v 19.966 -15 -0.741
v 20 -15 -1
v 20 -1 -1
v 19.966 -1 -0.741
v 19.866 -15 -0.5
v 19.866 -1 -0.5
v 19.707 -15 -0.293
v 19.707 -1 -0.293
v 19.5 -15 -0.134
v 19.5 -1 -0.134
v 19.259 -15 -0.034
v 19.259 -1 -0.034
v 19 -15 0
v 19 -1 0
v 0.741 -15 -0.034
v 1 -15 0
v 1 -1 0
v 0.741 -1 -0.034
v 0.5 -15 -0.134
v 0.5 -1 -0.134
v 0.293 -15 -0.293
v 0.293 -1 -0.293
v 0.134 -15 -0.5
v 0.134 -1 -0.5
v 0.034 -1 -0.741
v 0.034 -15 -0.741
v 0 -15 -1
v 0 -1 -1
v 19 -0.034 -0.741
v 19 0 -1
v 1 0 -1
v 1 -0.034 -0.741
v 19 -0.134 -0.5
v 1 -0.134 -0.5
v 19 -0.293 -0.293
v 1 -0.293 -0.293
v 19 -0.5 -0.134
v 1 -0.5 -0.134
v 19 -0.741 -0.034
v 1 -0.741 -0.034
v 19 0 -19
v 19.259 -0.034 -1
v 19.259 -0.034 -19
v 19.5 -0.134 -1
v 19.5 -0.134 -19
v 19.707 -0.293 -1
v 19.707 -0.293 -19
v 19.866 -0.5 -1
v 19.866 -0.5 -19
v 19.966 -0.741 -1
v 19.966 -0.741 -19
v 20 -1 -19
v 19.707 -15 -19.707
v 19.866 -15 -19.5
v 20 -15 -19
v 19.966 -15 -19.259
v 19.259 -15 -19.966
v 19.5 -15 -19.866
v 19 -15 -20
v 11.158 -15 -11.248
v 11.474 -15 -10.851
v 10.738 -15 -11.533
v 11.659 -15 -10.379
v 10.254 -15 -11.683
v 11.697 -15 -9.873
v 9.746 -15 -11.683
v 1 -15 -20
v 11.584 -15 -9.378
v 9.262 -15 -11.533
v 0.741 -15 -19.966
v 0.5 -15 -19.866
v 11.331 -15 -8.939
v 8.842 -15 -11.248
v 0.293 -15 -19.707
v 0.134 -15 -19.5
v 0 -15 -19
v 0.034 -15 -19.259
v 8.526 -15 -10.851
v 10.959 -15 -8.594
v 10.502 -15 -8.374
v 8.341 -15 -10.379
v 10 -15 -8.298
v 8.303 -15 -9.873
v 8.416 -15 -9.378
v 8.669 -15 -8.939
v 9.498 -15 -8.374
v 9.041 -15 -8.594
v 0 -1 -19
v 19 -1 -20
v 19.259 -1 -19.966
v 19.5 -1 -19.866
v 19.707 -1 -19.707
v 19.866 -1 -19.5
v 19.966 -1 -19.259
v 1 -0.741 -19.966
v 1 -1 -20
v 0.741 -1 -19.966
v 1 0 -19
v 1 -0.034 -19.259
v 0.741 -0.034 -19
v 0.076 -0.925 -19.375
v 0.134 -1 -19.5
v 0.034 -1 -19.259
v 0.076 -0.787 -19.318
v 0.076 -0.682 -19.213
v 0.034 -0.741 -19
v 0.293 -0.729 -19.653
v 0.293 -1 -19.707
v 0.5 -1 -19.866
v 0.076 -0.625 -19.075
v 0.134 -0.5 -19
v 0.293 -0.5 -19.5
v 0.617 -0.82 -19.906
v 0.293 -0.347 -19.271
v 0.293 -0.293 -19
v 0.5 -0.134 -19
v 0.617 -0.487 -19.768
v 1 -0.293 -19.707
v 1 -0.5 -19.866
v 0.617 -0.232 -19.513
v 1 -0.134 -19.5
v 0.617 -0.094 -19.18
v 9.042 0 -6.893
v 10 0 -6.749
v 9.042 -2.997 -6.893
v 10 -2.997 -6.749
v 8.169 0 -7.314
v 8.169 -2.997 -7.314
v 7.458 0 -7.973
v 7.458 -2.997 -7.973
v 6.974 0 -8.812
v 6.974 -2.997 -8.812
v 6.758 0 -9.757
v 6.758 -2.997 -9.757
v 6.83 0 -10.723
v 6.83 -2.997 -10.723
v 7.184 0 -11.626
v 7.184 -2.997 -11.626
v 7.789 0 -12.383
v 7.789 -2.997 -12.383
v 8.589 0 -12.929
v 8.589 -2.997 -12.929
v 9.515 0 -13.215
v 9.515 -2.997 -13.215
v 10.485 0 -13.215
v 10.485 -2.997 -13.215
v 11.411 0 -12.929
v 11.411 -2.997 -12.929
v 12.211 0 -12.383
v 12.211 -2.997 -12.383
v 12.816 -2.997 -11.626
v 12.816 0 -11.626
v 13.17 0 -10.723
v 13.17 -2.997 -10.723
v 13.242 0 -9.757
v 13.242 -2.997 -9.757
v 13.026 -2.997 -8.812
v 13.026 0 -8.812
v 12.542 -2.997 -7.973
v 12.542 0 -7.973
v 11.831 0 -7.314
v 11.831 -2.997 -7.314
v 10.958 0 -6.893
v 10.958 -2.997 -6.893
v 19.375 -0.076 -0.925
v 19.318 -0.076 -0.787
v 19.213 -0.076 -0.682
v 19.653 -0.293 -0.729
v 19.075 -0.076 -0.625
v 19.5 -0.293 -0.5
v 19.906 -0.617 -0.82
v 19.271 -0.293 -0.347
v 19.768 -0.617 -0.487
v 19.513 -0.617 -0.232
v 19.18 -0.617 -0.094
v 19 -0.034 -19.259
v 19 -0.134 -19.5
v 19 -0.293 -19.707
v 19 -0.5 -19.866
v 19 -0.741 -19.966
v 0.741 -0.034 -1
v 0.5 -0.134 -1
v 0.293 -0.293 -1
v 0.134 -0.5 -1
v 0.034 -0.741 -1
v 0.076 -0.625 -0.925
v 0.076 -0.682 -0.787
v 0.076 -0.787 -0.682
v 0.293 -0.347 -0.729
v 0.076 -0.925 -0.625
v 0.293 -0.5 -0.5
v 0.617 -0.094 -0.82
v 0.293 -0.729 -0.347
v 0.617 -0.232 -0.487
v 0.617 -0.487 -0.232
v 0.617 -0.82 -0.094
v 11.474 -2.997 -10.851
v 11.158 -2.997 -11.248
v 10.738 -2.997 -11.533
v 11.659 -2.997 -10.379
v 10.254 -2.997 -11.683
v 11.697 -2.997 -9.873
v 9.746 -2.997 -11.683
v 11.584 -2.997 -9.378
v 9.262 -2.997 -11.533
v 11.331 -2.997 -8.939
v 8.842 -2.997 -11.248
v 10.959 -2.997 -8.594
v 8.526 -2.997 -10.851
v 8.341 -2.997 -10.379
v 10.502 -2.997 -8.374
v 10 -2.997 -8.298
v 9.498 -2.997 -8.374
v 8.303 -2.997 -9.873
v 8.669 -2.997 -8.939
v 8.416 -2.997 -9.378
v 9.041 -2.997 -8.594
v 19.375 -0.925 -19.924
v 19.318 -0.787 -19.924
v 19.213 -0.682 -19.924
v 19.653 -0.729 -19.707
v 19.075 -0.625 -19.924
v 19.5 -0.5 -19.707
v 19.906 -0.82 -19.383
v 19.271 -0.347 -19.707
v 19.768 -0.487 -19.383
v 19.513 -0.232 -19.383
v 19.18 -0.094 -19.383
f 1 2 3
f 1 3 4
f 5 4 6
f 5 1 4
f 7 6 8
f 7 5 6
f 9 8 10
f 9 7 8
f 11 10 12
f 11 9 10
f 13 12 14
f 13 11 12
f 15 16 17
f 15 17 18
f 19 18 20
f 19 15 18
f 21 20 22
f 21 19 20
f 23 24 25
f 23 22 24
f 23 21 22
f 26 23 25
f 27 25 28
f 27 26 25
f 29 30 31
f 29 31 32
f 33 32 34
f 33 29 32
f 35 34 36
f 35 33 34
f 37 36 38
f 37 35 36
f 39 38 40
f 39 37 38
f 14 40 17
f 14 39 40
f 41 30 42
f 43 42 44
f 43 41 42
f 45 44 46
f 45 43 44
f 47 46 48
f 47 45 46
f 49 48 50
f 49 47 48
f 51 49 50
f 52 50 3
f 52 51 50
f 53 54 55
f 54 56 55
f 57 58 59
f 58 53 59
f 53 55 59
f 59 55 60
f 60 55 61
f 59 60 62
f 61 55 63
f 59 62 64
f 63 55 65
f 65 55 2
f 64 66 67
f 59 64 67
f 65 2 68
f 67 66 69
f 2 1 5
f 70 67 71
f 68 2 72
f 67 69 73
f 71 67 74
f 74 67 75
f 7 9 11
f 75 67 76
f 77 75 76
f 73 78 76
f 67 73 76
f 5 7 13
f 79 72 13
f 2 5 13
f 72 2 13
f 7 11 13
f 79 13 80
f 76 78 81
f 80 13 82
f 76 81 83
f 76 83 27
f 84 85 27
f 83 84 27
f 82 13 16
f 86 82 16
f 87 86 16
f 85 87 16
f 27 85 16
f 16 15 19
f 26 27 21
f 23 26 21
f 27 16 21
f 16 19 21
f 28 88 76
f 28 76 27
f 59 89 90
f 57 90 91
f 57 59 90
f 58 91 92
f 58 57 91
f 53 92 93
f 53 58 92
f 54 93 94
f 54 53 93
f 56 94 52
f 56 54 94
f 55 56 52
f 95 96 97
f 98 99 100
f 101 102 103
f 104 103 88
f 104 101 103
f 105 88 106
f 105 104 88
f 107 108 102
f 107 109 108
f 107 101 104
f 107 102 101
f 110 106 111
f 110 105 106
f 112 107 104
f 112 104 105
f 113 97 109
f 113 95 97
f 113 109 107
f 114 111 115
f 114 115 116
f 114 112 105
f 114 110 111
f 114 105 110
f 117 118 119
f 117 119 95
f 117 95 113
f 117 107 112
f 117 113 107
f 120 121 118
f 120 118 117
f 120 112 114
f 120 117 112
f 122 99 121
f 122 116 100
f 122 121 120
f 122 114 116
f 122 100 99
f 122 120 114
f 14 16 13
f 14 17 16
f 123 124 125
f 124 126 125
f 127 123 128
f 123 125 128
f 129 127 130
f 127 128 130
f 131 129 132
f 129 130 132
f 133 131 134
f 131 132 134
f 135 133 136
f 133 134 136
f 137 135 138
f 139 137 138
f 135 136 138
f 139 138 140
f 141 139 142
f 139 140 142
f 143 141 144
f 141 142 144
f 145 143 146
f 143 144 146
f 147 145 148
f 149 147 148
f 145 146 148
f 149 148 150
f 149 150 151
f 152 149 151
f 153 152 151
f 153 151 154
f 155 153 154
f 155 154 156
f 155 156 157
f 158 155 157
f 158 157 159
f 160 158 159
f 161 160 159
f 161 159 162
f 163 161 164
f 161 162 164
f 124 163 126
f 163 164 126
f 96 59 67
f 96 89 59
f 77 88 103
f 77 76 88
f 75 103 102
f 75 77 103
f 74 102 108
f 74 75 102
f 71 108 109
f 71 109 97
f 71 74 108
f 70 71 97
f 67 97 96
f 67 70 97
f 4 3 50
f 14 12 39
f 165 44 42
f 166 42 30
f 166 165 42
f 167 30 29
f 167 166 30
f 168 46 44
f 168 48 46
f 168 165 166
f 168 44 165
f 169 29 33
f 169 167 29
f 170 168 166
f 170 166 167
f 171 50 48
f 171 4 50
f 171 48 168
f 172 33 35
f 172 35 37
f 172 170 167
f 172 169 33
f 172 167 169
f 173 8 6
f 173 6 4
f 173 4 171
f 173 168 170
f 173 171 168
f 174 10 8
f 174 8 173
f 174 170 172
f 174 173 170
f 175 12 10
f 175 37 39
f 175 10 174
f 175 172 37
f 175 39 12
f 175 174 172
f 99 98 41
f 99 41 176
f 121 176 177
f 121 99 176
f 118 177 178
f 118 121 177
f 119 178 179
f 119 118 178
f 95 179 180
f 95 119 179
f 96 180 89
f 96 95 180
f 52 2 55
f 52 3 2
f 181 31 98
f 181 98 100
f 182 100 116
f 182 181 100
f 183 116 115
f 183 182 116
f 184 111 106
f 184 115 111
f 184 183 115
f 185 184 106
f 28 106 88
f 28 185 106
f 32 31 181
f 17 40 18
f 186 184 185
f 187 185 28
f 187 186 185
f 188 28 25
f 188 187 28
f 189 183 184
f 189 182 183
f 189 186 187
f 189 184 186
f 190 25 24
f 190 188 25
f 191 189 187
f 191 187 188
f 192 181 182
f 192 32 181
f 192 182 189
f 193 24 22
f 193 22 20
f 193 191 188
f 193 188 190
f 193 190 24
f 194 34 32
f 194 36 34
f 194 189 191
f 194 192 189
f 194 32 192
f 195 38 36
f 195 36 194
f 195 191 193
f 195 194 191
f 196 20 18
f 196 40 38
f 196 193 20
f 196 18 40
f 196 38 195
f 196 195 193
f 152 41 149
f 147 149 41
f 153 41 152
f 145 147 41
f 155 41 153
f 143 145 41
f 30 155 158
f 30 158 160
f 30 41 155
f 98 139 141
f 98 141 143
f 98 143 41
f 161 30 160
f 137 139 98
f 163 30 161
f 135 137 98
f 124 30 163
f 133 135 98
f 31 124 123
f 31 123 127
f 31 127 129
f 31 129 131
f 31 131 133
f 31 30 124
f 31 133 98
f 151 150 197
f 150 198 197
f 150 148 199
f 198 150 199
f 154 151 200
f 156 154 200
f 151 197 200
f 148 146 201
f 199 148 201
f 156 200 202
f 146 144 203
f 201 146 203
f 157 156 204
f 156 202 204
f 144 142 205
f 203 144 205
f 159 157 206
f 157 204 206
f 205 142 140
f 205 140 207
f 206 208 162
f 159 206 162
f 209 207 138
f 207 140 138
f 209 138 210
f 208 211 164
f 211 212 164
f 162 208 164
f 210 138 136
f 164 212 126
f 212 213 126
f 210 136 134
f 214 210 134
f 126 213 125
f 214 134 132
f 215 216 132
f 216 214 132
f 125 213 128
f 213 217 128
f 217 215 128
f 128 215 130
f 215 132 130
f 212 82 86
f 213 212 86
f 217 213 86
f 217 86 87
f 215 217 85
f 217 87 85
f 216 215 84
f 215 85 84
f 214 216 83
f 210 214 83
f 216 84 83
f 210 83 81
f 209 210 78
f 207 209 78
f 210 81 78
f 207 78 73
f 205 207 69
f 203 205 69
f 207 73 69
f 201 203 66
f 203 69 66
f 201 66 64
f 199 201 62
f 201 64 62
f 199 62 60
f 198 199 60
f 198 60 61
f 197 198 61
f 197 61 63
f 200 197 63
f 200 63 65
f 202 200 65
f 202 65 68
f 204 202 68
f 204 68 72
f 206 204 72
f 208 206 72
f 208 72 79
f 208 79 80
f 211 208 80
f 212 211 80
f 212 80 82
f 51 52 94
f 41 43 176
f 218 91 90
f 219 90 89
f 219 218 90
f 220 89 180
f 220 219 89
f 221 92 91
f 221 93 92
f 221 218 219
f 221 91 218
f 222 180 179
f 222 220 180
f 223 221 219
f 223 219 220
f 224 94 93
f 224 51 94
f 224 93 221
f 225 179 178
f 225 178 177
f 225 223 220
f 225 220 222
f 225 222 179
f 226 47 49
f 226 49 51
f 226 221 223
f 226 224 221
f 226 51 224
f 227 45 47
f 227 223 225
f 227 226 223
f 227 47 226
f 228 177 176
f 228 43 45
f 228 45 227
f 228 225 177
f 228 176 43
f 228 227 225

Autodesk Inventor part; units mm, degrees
ref_plane "YZ Plane" through (0, 0, 0) normal (1, 0, 0) x (0, 1, 0)
ref_plane "XZ Plane" through (0, 0, 0) normal (0, 1, 0) x (-1, 0, 0)
ref_plane "XY Plane" through (0, 0, 0) normal (0, 0, 1) x (1, 0, 0)
sketch "Sketch1" plane through (0, 0, 0) normal (0, 1, 0) x (-1, 0, 0)
  line L0 (0, 0) -> (-20, 0)
  line L1 (-20, 0) -> (-20, -20)
  line L2 (-20, -20) -> (0, -20)
  line L3 (0, -20) -> (0, 0)
  point P0 (-10, -10)
  point P1 (-20, -10)
  point P2 (-10, -20)
  dimension "d0" = 20
  dimension "d1" = 20
extrude "Extrusion1" add sketch "Sketch1" against normal blind 15
hole "Hole1" at (10, 0, -10) direction (0, -1, 0) diameter 3.4036 end through all counterbore diameter 6.5024 counterbore depth 2.9972 clearance for "Socket Head Cap Screw" size "M3" standard "Ansi Metric M Profile"
fillet "Fillet1" radius 1 8 edges at (20, -7.5, 0) (10, 0, 0) (20, 0, -10) (10, 0, -20) (0, 0, -10) (20, -7.5, -20) (0, -7.5, -20) (0, -7.5, 0)
properties part number "Stop Block"
